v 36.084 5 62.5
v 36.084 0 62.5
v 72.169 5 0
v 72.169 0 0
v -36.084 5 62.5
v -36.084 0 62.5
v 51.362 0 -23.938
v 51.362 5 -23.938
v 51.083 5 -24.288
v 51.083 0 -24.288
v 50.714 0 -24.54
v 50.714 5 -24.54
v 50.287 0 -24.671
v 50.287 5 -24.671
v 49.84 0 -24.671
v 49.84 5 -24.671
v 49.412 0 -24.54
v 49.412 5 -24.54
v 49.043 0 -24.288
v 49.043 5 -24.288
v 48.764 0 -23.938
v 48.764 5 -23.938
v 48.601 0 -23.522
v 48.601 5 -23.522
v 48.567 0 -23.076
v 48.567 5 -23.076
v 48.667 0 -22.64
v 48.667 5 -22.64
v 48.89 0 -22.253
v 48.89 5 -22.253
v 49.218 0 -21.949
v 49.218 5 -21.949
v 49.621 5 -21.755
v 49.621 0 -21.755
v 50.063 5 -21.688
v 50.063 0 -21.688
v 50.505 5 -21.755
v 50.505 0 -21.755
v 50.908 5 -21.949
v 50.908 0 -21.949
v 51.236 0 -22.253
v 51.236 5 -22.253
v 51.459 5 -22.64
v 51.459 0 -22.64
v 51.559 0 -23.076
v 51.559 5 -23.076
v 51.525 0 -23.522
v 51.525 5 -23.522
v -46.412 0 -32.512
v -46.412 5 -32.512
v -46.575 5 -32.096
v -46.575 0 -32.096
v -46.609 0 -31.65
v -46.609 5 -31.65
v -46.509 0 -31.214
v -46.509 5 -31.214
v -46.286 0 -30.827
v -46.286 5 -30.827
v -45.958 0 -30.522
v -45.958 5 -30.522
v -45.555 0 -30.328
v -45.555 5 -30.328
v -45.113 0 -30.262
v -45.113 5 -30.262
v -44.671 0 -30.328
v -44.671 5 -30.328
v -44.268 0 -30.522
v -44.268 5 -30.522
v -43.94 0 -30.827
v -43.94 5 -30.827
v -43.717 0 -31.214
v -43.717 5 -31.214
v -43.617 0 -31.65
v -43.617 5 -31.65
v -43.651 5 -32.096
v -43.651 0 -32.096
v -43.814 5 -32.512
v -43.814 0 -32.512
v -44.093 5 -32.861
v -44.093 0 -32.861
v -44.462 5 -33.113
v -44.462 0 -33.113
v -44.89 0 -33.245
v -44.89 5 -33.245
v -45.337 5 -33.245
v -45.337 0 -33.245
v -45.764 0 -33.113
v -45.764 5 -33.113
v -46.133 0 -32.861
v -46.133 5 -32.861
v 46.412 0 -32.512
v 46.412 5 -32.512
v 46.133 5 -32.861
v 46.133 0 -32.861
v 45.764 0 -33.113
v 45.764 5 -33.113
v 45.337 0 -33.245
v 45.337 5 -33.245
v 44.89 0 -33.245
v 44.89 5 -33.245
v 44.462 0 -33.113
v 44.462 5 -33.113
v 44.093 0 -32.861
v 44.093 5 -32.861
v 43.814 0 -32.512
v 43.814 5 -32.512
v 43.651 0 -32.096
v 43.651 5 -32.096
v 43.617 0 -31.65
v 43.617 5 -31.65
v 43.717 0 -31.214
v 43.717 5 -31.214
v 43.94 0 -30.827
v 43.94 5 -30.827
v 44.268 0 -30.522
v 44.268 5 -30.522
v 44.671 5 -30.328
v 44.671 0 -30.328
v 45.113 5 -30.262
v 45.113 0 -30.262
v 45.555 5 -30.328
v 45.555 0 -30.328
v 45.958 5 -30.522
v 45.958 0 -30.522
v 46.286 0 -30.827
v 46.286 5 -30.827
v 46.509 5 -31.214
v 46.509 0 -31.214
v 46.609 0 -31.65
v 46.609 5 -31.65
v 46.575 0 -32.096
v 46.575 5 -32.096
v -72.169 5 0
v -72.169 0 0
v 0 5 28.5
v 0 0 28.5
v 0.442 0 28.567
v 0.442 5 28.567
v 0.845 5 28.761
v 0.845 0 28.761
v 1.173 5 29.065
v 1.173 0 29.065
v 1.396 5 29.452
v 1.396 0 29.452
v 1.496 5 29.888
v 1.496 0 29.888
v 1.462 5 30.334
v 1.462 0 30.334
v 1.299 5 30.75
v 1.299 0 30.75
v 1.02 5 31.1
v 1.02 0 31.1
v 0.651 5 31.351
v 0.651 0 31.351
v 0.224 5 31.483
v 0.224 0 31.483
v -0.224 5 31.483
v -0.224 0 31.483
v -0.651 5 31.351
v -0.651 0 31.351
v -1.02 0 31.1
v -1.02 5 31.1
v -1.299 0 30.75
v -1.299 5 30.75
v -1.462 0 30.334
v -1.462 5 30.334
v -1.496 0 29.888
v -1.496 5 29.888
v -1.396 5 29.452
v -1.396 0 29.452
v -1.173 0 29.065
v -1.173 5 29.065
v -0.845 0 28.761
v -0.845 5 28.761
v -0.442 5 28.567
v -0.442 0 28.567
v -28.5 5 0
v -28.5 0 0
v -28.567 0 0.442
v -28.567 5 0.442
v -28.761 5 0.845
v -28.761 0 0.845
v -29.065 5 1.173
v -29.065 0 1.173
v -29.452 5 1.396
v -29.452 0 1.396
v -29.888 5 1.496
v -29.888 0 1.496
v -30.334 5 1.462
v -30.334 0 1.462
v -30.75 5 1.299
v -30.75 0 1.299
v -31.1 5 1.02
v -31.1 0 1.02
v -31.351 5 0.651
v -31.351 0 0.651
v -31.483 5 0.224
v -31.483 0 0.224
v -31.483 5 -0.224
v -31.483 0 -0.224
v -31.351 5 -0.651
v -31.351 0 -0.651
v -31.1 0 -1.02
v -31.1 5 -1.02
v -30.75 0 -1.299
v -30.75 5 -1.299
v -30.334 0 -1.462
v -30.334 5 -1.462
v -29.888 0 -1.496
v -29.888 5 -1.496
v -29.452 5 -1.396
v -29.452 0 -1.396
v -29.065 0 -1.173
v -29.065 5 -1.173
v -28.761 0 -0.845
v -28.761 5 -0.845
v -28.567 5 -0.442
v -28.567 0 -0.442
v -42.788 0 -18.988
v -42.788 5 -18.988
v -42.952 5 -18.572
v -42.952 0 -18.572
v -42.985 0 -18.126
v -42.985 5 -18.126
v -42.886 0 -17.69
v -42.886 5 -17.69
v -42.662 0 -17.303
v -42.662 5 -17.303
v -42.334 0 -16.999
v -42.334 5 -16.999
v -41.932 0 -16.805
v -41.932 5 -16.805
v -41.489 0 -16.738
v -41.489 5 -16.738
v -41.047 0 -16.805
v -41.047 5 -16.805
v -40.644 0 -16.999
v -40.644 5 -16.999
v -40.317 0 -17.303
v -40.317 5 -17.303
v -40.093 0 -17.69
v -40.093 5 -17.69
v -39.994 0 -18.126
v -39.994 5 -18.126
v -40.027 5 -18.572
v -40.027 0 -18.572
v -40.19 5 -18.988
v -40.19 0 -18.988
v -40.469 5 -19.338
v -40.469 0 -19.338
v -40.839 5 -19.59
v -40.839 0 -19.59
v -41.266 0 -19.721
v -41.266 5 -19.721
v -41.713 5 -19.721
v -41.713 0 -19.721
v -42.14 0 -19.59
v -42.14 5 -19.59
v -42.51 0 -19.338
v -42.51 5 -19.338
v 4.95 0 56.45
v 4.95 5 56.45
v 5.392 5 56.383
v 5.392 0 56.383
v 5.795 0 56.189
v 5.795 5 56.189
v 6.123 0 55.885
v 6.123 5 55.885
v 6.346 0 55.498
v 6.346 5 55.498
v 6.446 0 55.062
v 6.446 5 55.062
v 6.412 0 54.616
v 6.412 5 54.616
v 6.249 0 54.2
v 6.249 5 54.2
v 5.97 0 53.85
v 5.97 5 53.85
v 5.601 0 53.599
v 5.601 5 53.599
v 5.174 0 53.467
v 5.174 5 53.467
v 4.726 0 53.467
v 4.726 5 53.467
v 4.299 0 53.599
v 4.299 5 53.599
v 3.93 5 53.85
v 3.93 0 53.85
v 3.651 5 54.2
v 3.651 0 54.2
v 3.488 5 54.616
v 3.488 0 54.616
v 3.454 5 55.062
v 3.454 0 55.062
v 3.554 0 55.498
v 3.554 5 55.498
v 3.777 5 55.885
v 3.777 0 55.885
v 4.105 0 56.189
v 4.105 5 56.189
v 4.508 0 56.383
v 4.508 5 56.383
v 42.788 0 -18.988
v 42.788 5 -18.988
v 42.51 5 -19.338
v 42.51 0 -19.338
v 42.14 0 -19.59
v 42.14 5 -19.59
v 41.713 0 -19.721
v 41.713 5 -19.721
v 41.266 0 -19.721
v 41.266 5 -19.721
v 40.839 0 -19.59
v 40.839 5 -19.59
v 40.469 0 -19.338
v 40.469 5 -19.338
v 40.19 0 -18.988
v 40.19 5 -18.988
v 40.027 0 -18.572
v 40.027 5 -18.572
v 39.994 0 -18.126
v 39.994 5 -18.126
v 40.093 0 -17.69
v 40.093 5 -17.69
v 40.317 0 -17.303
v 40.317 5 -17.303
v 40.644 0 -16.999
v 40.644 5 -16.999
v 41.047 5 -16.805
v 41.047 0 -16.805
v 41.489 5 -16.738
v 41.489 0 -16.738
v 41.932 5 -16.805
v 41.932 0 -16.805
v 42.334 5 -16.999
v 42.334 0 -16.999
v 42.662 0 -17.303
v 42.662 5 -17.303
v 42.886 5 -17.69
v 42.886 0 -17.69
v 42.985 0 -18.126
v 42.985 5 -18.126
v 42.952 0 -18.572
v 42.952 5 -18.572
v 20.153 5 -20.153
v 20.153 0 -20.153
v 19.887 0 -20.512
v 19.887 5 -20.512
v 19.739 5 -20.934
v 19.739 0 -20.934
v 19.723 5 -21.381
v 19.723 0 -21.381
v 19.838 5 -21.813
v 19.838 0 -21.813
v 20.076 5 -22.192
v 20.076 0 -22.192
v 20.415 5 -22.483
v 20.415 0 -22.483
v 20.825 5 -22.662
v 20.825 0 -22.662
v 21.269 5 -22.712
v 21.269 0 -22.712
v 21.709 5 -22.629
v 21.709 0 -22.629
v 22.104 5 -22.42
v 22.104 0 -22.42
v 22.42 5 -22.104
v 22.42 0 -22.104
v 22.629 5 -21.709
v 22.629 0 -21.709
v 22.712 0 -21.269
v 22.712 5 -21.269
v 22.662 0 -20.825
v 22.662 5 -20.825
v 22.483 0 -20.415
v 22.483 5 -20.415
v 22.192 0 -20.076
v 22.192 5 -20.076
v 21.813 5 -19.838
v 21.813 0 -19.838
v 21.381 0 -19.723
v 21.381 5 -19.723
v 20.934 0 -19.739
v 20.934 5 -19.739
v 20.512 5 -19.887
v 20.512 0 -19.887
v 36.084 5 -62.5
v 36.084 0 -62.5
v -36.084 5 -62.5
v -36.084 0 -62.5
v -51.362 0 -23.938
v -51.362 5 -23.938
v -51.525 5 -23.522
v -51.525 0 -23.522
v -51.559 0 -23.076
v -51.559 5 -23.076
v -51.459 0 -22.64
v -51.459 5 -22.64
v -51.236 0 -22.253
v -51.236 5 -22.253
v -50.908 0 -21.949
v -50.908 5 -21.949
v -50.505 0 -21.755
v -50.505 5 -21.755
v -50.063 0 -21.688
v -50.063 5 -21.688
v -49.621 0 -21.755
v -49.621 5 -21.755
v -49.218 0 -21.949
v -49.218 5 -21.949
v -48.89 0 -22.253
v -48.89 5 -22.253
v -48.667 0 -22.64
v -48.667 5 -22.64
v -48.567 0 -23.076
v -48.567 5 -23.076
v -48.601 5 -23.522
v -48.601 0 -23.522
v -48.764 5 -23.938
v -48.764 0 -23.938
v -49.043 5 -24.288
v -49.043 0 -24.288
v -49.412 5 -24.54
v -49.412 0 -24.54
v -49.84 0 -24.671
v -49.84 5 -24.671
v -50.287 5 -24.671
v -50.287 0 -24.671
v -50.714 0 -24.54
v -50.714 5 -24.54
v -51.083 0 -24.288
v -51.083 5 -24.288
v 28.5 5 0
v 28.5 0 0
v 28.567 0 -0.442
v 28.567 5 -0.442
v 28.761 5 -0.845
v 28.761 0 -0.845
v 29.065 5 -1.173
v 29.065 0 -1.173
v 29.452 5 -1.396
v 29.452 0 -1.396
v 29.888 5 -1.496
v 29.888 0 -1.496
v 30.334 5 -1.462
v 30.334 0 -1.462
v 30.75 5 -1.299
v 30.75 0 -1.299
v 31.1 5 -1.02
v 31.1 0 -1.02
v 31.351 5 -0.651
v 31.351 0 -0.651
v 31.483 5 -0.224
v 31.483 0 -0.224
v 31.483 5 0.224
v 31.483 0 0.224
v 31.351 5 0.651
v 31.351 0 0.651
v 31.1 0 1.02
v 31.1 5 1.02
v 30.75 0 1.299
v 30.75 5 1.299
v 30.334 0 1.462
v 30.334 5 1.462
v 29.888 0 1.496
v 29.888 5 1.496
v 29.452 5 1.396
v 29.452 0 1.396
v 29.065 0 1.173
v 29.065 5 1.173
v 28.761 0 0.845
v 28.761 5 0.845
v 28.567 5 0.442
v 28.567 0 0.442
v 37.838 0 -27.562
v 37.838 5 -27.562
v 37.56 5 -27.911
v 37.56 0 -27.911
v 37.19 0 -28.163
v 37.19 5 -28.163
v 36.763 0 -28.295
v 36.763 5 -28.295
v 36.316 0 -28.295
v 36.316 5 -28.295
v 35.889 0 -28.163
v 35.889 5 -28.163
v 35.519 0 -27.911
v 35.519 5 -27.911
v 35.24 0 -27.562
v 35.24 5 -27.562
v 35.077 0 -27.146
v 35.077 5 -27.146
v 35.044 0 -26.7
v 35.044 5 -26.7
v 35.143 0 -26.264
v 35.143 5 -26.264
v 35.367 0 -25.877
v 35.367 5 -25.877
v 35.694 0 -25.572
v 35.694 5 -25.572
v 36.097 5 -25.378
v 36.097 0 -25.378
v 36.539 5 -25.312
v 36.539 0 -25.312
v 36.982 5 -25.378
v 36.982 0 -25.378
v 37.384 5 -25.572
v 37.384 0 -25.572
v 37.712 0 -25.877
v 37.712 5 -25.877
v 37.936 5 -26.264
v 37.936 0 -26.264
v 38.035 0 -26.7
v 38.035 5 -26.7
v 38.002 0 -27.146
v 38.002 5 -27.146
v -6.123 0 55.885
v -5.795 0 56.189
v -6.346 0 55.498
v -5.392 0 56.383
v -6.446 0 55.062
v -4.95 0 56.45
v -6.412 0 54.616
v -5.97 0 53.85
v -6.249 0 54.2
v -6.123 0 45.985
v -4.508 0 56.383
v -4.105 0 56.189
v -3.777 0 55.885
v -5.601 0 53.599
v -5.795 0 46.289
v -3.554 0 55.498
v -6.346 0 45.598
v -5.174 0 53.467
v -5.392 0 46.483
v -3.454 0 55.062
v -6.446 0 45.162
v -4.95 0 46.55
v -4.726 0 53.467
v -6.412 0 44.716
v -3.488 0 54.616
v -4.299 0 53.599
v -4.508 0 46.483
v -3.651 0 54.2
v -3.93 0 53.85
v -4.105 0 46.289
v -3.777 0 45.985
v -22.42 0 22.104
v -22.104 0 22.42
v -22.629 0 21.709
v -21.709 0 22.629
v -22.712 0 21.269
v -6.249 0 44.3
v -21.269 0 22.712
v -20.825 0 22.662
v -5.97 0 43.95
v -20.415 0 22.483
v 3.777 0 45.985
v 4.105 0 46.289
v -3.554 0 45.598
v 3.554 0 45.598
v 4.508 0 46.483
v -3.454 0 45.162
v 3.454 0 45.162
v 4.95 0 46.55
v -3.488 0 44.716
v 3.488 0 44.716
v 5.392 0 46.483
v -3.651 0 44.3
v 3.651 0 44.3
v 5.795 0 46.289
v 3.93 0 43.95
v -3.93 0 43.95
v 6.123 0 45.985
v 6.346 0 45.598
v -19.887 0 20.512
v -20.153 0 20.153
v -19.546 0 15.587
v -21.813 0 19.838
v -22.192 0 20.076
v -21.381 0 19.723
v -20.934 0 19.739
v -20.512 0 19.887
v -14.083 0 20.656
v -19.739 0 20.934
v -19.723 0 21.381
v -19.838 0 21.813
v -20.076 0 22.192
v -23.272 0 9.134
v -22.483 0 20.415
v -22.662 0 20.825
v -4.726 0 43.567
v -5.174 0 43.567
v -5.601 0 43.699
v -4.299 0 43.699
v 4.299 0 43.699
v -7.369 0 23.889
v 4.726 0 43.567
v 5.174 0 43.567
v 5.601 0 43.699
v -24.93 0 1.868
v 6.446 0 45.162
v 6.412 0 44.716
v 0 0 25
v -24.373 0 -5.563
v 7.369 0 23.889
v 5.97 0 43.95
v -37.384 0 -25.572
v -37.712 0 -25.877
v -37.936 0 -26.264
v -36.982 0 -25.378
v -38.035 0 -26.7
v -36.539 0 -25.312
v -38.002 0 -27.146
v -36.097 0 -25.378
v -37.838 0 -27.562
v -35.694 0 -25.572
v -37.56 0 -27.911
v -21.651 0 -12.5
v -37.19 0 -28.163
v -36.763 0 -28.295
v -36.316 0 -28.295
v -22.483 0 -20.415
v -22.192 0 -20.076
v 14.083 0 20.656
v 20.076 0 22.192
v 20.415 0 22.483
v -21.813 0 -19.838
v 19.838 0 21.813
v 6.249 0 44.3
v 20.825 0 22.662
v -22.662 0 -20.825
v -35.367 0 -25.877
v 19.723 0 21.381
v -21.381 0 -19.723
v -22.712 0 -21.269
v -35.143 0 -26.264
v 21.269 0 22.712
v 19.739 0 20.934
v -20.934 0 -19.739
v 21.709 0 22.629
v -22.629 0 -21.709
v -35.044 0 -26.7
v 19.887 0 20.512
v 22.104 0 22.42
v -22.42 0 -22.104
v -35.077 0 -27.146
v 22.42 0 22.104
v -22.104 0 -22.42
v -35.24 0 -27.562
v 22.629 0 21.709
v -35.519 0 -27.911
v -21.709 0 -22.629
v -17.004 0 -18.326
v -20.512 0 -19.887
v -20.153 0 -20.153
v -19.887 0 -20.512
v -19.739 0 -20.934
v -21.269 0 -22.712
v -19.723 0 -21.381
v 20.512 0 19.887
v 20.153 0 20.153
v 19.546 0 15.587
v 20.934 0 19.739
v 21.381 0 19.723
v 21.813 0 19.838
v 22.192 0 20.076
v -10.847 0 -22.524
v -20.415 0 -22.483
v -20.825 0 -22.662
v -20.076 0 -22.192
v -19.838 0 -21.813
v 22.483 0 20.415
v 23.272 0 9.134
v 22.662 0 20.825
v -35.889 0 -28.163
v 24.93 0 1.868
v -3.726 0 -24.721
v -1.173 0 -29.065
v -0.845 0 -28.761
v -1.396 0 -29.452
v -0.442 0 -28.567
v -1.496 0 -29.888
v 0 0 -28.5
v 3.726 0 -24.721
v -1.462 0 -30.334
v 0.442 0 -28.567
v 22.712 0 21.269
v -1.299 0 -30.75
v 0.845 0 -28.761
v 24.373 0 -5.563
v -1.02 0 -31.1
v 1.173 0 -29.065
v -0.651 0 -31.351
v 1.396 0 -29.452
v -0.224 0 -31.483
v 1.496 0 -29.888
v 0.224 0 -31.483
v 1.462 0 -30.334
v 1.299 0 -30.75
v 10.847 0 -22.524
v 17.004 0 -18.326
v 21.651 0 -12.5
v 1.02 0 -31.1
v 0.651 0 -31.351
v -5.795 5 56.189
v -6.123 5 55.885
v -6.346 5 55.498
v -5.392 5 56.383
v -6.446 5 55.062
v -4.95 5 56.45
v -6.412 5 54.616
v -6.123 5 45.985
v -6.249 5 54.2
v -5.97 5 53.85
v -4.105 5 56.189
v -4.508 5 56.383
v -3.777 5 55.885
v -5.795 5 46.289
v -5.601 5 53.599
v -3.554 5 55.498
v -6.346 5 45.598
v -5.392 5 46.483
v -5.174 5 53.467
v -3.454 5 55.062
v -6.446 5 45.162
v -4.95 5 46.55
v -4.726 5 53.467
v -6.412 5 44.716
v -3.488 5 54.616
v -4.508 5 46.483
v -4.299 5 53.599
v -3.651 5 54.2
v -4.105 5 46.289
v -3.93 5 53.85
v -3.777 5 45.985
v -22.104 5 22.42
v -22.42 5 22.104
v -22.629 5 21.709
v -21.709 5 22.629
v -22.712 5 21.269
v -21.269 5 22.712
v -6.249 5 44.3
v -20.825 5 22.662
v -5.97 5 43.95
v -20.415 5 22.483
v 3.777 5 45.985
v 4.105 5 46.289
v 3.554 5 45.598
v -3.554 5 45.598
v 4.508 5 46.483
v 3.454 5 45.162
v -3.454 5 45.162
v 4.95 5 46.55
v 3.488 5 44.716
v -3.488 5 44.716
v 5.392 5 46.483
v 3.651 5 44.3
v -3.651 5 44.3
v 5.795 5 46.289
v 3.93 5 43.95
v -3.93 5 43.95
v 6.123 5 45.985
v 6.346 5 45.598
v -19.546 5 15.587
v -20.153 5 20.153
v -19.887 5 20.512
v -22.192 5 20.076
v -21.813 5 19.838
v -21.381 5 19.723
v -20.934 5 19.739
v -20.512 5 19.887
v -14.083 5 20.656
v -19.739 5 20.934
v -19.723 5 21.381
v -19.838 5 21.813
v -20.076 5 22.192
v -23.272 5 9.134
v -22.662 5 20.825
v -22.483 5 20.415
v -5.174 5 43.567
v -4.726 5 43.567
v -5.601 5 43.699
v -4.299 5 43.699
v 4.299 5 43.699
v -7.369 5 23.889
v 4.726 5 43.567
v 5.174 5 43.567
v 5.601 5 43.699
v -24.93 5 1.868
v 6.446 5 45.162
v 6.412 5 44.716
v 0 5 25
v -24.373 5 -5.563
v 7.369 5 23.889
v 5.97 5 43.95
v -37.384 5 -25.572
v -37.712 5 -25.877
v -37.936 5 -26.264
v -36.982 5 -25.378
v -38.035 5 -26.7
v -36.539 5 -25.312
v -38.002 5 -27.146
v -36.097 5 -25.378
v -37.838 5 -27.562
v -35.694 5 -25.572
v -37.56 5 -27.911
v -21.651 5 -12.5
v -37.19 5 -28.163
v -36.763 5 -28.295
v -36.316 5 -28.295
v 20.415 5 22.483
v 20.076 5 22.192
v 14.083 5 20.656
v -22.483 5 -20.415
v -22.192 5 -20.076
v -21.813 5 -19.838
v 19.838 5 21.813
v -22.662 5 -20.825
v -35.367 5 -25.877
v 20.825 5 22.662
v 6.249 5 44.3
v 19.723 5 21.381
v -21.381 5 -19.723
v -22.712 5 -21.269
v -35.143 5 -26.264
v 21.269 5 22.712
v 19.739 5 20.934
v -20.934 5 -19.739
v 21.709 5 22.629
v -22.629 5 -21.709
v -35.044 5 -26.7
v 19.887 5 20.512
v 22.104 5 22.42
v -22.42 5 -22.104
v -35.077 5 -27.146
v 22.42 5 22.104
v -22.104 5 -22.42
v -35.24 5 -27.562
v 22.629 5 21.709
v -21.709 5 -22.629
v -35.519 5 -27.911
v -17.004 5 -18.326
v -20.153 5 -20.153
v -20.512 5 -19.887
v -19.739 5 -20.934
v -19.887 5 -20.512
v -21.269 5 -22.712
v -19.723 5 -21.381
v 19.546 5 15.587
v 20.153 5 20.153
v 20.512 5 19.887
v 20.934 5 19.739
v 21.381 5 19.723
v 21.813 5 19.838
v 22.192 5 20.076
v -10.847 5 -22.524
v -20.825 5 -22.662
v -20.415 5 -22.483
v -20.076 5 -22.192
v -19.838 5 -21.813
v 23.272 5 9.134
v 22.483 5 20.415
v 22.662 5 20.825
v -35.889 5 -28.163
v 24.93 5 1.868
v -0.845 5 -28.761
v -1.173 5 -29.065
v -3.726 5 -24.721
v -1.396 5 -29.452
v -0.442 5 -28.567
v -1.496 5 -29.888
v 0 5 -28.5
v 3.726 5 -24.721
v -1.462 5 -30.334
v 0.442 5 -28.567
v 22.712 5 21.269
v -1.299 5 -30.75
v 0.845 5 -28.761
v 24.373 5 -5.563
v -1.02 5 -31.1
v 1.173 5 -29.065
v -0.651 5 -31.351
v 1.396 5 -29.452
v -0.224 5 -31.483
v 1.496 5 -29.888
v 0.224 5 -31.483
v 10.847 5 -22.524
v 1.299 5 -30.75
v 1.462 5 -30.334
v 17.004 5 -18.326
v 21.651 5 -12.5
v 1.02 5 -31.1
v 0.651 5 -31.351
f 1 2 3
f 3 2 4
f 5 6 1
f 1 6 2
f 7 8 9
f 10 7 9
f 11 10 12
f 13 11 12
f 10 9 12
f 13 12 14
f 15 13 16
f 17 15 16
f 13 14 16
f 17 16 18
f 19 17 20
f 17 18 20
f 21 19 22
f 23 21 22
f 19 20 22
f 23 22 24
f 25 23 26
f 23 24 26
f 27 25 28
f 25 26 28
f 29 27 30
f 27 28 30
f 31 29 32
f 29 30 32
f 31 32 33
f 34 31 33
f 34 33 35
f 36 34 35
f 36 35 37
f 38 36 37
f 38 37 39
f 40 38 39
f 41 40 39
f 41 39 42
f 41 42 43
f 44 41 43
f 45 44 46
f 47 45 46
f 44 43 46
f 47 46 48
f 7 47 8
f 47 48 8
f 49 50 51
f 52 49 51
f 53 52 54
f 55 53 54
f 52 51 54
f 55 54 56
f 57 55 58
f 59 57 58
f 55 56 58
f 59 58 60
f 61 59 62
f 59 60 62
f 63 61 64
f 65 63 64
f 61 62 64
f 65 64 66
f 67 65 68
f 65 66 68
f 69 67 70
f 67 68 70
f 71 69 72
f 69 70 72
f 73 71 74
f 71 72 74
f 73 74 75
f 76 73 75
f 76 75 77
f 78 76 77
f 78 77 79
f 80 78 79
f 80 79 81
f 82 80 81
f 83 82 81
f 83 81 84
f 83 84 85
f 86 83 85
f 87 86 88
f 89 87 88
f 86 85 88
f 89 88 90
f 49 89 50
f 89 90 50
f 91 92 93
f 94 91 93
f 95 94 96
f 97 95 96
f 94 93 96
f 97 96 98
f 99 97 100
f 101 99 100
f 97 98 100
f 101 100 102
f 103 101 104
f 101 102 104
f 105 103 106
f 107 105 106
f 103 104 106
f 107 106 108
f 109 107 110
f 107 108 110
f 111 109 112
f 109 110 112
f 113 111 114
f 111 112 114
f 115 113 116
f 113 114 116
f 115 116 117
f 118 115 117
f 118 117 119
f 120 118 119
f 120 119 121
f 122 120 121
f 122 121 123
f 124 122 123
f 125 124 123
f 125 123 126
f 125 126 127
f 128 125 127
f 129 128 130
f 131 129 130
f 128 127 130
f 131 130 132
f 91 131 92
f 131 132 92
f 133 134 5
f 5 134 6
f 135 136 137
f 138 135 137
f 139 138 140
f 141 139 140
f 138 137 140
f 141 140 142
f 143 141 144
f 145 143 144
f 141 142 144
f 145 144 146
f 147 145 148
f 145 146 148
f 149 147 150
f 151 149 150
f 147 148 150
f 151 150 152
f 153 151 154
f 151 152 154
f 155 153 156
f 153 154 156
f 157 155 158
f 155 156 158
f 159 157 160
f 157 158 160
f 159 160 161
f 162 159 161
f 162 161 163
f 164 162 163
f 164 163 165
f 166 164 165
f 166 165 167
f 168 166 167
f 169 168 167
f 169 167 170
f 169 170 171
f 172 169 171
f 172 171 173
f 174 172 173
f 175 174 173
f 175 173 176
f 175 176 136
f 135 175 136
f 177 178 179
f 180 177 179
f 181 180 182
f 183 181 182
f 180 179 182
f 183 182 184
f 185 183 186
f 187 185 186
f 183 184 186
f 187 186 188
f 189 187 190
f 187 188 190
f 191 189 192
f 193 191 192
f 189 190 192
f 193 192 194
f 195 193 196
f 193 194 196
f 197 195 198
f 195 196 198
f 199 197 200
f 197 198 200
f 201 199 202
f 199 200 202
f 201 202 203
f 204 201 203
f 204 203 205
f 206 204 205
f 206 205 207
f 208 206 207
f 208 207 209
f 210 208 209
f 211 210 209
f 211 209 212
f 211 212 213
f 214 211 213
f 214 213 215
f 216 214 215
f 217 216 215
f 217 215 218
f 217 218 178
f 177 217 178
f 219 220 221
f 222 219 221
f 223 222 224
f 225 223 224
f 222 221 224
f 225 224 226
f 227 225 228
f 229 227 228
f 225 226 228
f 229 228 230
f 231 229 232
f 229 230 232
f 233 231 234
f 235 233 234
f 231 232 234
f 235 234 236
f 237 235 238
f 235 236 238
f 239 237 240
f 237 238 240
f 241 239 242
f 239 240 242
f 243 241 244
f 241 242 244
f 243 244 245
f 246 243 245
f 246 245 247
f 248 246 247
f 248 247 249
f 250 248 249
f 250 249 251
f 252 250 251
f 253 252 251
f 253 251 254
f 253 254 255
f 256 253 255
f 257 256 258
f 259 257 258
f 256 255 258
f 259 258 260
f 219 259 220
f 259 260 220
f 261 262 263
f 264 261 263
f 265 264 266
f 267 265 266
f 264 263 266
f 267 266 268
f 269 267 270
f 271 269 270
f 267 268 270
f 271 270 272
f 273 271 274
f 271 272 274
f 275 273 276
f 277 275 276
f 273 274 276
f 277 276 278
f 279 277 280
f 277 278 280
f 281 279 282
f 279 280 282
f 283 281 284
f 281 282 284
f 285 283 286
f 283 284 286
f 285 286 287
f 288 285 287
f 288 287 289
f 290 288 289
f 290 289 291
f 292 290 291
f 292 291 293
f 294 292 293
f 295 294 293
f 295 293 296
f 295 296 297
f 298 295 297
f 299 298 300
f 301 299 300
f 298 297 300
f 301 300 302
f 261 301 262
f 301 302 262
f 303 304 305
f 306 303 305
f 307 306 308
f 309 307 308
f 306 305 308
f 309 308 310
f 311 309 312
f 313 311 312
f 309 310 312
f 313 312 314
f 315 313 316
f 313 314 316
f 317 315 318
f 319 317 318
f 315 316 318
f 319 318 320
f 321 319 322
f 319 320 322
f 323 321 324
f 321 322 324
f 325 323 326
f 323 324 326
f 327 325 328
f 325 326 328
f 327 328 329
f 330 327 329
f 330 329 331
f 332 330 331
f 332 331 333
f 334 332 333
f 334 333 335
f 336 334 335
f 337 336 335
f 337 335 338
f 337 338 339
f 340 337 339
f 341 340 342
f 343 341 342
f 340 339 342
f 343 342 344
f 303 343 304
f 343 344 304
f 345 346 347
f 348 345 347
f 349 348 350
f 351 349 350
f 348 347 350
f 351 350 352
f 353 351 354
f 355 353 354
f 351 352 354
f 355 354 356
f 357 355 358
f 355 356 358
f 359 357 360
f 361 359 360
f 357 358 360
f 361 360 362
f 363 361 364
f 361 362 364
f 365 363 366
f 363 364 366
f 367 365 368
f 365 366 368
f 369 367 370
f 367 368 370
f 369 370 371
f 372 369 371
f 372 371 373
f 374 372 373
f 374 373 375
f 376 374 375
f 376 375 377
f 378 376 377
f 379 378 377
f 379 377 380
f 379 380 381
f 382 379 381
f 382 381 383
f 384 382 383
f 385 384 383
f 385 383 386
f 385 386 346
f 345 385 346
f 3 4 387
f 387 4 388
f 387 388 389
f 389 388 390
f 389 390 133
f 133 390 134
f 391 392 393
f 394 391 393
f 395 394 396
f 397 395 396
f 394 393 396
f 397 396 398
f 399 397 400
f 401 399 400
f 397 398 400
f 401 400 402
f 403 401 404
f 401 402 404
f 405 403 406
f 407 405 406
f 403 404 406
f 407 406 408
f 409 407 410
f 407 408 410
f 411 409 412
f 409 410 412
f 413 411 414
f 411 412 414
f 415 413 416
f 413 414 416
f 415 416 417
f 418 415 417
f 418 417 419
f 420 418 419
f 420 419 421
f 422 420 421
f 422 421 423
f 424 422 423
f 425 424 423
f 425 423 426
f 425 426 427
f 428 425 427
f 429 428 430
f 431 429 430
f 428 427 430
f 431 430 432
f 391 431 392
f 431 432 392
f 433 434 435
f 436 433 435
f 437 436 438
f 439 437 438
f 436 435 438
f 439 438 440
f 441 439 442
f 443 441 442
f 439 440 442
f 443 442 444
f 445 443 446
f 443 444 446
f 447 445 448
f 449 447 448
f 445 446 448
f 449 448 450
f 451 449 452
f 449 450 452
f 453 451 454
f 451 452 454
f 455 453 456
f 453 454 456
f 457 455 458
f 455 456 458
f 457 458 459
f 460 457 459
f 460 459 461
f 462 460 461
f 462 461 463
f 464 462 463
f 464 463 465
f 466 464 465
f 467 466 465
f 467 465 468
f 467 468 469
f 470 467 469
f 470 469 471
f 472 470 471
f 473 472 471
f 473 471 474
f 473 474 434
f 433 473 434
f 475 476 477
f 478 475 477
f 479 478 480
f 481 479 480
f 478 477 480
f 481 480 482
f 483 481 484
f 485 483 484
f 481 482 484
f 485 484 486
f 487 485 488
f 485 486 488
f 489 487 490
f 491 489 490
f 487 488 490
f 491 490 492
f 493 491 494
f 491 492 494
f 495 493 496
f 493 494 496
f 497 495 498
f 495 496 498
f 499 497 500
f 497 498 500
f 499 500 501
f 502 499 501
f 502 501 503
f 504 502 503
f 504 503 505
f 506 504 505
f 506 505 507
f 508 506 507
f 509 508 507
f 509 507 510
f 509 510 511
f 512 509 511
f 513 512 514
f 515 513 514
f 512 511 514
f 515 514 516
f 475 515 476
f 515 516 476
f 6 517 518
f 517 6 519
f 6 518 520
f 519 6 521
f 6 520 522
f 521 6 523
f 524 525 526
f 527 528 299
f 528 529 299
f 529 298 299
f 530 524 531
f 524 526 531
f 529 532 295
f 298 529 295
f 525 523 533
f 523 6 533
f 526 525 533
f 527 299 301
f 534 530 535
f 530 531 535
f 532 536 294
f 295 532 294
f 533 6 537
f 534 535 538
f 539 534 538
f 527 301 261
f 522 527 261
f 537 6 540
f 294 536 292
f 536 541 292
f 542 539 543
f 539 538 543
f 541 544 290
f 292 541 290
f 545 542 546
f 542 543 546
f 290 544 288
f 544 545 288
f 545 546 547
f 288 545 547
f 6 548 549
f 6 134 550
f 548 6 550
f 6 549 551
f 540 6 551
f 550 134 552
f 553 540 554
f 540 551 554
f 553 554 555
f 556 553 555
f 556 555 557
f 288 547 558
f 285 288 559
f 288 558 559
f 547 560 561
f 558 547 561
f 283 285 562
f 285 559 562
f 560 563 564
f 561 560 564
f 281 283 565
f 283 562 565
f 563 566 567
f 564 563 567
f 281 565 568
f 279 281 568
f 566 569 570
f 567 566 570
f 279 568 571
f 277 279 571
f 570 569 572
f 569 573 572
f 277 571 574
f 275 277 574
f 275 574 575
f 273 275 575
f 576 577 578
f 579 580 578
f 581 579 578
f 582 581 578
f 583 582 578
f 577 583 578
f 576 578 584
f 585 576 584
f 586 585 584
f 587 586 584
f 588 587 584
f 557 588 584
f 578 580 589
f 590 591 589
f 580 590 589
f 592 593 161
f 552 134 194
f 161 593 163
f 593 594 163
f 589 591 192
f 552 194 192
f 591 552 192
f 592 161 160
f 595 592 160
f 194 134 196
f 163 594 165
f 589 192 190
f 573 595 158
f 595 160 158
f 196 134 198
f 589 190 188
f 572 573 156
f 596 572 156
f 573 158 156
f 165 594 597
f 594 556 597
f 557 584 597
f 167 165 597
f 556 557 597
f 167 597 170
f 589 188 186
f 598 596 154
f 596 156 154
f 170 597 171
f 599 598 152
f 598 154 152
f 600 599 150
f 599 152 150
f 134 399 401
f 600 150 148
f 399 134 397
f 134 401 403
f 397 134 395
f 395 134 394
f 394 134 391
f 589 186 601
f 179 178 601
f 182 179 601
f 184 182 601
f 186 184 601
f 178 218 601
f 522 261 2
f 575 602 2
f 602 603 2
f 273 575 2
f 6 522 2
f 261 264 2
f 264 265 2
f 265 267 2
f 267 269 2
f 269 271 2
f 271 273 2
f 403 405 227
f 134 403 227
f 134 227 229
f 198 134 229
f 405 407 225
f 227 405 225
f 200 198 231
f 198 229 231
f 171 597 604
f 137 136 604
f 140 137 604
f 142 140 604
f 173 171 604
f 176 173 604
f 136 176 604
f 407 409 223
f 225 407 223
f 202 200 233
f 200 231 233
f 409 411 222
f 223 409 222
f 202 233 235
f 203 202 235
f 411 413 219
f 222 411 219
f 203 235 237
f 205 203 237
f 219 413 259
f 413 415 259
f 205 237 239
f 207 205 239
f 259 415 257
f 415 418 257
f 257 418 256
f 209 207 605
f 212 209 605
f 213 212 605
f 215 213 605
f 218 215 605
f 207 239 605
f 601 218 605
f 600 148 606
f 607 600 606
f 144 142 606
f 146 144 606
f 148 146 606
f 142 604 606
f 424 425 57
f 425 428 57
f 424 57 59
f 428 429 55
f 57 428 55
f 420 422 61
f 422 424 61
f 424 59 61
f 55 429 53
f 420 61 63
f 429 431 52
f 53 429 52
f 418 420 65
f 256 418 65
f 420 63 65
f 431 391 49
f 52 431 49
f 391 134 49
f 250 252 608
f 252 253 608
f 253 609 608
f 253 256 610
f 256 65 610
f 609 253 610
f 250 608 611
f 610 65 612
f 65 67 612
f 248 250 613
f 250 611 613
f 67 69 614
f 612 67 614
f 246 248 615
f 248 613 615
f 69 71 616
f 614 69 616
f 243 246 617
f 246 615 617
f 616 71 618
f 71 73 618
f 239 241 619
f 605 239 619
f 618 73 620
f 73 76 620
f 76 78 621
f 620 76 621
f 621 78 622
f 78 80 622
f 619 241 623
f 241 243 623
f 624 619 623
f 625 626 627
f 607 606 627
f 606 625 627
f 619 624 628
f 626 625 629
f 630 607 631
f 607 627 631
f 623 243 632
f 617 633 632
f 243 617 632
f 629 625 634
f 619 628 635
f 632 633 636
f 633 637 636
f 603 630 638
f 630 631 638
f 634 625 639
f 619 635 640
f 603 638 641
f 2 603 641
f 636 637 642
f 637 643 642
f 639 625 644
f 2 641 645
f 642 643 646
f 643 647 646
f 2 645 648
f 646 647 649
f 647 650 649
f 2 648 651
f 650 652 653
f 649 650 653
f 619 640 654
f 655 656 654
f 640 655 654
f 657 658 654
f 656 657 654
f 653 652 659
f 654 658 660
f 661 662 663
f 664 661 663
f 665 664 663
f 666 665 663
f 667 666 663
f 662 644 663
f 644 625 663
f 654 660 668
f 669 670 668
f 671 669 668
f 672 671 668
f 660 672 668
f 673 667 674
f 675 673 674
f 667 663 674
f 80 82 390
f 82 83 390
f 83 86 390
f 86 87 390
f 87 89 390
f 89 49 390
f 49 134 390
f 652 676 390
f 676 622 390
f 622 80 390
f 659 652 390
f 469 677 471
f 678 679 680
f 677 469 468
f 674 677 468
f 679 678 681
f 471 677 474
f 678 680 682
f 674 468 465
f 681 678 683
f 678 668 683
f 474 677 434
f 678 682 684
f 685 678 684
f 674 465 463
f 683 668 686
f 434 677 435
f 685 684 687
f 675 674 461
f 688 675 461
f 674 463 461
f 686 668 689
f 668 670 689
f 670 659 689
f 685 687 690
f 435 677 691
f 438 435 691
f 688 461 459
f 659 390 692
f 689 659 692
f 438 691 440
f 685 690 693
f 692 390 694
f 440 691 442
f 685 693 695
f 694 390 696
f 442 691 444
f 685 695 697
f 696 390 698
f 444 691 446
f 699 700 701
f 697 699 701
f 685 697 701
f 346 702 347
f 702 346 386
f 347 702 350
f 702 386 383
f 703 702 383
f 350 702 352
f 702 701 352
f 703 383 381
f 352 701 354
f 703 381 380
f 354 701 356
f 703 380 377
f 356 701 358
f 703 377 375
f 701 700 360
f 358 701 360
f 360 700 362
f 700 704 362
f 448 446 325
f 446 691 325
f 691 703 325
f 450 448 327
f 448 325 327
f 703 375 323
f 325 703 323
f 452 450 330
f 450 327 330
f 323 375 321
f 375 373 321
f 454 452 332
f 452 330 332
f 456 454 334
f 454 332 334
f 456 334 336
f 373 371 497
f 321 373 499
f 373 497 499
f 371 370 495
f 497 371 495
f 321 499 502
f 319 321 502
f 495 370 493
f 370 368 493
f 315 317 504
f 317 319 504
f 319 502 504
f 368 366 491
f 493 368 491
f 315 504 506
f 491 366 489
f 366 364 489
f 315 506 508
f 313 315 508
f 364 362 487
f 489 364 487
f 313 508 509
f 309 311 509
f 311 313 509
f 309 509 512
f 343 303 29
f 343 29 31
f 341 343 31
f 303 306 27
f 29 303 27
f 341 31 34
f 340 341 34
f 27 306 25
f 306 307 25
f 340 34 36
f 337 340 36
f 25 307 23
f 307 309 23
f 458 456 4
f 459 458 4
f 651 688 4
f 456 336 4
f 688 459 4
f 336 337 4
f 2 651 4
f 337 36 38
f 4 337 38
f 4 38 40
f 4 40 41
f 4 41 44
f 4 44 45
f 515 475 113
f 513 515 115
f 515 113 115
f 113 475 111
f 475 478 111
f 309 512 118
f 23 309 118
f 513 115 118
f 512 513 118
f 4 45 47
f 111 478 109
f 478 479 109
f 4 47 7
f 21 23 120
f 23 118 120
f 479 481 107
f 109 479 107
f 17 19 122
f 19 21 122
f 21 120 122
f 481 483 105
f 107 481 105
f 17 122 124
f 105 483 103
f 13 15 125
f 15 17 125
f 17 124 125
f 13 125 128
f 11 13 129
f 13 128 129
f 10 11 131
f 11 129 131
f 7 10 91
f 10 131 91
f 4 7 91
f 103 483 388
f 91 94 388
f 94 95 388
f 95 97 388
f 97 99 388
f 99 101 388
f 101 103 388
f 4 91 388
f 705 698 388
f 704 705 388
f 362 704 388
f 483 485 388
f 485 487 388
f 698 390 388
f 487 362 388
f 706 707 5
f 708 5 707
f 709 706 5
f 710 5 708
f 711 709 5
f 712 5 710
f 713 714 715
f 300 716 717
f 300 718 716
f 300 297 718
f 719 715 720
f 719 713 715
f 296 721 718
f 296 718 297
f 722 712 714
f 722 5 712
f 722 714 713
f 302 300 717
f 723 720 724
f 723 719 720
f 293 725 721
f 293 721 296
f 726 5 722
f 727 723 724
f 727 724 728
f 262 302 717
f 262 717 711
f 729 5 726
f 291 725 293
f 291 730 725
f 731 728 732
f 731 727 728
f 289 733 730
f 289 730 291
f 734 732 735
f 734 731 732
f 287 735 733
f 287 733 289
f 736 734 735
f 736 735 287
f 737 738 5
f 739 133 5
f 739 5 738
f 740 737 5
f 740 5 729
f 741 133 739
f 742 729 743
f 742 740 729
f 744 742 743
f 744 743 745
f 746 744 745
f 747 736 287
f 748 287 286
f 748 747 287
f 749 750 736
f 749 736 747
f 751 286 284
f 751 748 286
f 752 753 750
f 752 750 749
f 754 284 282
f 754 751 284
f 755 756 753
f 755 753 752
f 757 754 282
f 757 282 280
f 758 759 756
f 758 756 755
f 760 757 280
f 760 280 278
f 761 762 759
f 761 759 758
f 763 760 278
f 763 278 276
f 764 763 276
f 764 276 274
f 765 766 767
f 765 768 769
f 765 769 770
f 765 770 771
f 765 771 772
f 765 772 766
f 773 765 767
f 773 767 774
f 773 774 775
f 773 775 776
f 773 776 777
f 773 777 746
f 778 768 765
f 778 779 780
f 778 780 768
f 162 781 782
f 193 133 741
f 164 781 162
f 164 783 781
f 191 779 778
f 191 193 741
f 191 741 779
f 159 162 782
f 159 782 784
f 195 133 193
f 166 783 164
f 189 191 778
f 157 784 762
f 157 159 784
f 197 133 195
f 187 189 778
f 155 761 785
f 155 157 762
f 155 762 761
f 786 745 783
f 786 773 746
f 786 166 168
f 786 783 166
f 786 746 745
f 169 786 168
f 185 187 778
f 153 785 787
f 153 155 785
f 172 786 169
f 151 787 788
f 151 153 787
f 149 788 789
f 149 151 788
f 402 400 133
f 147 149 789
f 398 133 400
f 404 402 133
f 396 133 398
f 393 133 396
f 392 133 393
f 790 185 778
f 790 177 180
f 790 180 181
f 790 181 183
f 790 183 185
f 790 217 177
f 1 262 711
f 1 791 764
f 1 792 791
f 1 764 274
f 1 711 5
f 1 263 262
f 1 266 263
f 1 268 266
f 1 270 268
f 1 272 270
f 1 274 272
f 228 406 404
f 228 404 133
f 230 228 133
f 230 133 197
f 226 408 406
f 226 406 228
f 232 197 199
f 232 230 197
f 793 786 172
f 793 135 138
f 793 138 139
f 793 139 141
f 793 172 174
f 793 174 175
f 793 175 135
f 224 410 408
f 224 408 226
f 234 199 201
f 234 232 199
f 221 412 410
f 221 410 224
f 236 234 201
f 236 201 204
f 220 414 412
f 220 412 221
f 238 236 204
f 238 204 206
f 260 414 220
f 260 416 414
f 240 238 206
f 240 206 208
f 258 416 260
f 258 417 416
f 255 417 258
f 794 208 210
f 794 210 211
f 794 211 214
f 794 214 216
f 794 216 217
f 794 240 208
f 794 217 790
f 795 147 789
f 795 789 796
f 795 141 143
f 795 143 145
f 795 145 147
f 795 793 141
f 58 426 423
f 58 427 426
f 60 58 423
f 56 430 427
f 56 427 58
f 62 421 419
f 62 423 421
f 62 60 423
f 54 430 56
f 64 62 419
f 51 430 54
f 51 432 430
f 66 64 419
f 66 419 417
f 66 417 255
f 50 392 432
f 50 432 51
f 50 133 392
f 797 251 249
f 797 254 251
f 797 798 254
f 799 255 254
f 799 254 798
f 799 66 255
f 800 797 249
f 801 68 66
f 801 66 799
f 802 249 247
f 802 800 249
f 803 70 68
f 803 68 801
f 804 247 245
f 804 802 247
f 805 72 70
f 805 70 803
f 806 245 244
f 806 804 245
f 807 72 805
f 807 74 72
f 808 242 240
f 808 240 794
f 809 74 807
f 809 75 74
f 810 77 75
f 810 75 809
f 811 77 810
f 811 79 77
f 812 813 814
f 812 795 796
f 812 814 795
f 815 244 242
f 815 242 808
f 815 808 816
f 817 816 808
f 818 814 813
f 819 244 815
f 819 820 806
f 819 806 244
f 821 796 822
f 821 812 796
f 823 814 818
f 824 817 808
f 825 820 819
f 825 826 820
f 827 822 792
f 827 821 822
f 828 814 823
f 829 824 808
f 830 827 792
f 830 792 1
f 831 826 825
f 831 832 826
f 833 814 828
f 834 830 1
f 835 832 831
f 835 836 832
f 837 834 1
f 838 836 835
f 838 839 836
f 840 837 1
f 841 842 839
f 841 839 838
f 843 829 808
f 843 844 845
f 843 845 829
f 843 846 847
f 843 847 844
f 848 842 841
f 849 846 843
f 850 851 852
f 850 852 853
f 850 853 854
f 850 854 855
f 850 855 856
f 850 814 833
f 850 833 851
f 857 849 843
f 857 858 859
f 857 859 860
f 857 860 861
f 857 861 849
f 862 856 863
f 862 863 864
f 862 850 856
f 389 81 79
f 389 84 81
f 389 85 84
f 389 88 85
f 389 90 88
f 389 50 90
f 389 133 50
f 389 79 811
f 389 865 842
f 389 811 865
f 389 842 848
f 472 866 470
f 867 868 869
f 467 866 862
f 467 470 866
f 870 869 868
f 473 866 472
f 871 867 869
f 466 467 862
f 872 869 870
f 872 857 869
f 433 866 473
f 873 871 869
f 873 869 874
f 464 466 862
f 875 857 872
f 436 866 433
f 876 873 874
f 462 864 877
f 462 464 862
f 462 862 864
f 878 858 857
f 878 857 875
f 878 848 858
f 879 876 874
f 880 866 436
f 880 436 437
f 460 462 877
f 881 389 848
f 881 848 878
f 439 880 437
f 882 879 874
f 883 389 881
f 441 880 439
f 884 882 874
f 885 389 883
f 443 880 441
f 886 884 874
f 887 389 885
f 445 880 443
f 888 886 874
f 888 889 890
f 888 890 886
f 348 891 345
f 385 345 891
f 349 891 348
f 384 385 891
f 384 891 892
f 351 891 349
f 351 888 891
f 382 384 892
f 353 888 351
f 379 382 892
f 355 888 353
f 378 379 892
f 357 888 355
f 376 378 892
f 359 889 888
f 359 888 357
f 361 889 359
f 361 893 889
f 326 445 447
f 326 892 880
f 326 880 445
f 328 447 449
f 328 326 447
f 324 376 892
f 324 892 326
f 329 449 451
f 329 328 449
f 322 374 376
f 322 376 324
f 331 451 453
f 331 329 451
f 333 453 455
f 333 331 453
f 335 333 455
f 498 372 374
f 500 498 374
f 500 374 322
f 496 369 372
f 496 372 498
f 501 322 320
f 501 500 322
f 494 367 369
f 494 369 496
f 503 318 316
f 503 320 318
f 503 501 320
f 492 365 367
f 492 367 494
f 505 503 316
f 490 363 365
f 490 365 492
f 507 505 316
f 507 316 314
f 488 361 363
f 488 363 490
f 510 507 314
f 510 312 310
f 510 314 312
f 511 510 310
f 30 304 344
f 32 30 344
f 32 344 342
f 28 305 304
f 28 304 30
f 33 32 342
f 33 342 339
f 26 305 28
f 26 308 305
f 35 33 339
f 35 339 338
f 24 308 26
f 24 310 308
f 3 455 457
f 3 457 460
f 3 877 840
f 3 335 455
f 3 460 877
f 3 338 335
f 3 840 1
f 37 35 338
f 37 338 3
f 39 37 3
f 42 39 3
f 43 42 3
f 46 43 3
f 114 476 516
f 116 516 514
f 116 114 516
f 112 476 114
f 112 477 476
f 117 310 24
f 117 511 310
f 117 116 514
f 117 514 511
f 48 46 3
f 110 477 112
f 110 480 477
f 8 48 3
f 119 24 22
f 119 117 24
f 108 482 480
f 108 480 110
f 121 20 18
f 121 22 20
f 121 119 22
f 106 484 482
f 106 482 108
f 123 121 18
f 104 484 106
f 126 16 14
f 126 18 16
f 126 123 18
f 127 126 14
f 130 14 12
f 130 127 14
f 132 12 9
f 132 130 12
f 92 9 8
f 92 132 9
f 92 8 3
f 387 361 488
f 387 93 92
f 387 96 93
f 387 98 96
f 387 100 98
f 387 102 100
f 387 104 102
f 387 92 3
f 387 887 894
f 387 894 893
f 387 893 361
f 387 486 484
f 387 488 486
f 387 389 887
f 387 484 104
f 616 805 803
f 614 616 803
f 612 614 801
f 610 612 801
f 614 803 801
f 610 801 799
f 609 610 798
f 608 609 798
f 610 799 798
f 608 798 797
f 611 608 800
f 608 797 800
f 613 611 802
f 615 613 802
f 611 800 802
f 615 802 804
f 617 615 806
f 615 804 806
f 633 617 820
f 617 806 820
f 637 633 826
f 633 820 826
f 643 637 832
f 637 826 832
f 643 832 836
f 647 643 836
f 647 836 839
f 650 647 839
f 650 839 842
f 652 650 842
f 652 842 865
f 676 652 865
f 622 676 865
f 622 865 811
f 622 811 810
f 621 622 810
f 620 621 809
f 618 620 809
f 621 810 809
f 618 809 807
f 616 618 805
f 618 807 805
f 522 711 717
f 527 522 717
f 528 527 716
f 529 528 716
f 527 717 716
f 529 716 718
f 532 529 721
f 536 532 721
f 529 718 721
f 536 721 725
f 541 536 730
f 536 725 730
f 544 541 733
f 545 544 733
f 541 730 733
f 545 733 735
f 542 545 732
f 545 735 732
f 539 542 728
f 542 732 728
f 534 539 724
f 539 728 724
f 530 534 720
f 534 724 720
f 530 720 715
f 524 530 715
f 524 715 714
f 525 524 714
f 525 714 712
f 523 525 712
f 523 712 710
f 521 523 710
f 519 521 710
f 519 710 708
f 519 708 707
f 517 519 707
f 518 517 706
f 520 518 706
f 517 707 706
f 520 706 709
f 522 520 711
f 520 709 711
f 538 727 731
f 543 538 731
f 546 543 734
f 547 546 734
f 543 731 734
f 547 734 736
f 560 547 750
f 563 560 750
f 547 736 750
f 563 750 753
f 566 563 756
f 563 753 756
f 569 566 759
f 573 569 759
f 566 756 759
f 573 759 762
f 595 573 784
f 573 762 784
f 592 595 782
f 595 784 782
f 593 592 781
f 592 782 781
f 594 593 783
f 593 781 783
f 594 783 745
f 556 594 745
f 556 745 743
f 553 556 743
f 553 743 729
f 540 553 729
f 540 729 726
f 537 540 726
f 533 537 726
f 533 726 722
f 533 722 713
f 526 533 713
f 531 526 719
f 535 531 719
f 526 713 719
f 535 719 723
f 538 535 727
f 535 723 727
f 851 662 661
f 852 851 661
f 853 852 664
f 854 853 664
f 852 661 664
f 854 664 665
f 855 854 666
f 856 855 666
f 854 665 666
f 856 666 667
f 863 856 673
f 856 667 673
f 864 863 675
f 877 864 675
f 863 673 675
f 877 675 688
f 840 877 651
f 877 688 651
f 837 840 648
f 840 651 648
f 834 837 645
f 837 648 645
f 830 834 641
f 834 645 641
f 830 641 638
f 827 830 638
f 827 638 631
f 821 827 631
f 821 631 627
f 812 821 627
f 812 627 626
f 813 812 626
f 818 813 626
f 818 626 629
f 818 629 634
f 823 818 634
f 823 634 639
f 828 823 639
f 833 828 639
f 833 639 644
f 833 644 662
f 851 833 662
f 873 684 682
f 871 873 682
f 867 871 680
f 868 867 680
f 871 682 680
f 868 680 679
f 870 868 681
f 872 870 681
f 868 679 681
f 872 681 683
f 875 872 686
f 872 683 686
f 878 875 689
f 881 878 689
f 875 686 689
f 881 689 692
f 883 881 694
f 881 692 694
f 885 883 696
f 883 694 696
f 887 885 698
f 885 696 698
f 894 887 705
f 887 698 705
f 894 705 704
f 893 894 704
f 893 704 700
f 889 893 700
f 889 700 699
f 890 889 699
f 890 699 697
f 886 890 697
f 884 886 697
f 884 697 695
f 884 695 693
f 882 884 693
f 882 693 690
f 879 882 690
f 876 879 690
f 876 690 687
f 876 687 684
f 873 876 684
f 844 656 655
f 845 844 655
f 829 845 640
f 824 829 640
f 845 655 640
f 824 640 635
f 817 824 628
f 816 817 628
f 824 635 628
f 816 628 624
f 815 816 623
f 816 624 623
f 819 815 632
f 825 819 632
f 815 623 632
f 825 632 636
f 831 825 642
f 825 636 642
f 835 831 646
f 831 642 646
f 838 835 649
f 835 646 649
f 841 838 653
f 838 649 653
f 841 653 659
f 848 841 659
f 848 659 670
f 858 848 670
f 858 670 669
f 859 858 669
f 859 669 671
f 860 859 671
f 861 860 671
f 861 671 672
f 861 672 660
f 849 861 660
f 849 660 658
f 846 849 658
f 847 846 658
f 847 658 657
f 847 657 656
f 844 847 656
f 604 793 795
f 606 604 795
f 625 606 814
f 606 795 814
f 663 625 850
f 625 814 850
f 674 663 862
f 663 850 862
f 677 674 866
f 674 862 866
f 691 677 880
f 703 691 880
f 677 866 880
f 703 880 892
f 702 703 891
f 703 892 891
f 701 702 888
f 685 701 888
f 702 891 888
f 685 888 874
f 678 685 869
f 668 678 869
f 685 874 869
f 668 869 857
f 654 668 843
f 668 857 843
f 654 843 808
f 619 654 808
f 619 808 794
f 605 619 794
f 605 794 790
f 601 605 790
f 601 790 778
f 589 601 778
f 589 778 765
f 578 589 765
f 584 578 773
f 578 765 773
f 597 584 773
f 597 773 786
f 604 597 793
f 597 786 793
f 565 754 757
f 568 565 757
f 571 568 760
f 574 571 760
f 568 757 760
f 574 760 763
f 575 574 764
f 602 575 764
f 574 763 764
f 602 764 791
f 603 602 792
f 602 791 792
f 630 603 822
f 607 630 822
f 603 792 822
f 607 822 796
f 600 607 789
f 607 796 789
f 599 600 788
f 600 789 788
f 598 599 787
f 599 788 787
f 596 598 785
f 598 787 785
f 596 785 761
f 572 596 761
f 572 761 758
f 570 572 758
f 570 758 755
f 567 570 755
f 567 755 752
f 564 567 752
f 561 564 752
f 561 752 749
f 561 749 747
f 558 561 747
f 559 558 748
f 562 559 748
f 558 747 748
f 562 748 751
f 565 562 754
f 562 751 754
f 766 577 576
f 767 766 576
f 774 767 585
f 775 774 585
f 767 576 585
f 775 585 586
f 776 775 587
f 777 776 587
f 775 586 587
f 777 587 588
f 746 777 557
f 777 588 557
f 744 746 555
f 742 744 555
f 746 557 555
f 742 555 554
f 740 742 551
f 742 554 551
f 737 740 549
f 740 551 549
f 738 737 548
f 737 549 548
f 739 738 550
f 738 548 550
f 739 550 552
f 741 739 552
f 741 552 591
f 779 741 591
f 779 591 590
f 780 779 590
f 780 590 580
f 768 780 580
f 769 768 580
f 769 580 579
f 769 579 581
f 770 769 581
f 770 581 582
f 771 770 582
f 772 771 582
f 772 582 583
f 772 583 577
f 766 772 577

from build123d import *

# Parameters (mm, degrees)
EXTRUDE_1_DEPTH          = 5
SKETCH_2_R               = 25
CUT_EXTRUDE_1_DEPTH      = 5
SKETCH_3_R               = 1.5
CUT_EXTRUDE_2_DEPTH      = 5
PATTERN_CIRCULAR_1_COUNT = 3
SKETCH_5_R               = 1.5
CUT_EXTRUDE_3_DEPTH      = 13
PATTERN_CIRCULAR_2_COUNT = 8


with BuildPart() as part:
    # 草图1 → 凸台-拉伸1 (new body)
    with BuildSketch(Plane(origin=(0, 0, 0), x_dir=(1, 0, 0), z_dir=(0, 1, 0))):
        Polygon((36.084391824, 62.5), (-36.084391824, 62.5), (-72.168783649, 0), (-36.084391824, -62.5), (36.084391824, -62.5), (72.168783649, 0), align=None)
    extrude(amount=EXTRUDE_1_DEPTH)

    # 草图2 → 切除-拉伸1 (cut)
    with BuildSketch(Plane(origin=(0, 5, 0), x_dir=(1, 0, 0), z_dir=(0, 1, 0))):
        with Locations(Location((0, 0, 0), (0, 0, 270))):
            Circle(SKETCH_2_R)
    extrude(amount=-CUT_EXTRUDE_1_DEPTH, mode=Mode.SUBTRACT)

    # 草图3 → 切除-拉伸2 (cut)
    with BuildSketch(Plane(origin=(0, 5, 0), x_dir=(1, 0, 0), z_dir=(0, 1, 0))):
        with Locations(Location((-4.95, -45.05, 0), (0, 0, 270))):
            Circle(SKETCH_3_R)
        with Locations(Location((4.95, -45.05, 0), (0, 0, 270))):
            Circle(SKETCH_3_R)
        with Locations(Location((-4.95, -54.95, 0), (0, 0, 270))):
            Circle(SKETCH_3_R)
        with Locations(Location((4.95, -54.95, 0), (0, 0, 270))):
            Circle(SKETCH_3_R)
    cut_extrude_2 = extrude(amount=-CUT_EXTRUDE_2_DEPTH, mode=Mode.SUBTRACT)

    # 阵列(圆周)1: 切除-拉伸2 ×3 about axis
    pattern_circular_1_axis = Axis((0, 0, 0), (0, 1, 0))
    for i in range(1, PATTERN_CIRCULAR_1_COUNT):
        add(cut_extrude_2.rotate(pattern_circular_1_axis, i * 360 / PATTERN_CIRCULAR_1_COUNT), mode=Mode.SUBTRACT)

    # 草图5 → 切除-拉伸3 (cut)
    with BuildSketch(Plane.XZ):
        with Locations(Location((0, 30, 0), (0, 0, 270))):
            Circle(SKETCH_5_R)
    cut_extrude_3 = extrude(amount=-CUT_EXTRUDE_3_DEPTH, mode=Mode.SUBTRACT)

    # 阵列(圆周)2: 切除-拉伸3 ×8 about axis
    pattern_circular_2_axis = Axis((0, 0, 0), (0, 1, 0))
    for i in range(1, PATTERN_CIRCULAR_2_COUNT):
        add(cut_extrude_3.rotate(pattern_circular_2_axis, i * 360 / PATTERN_CIRCULAR_2_COUNT), mode=Mode.SUBTRACT)


solid = part.part
